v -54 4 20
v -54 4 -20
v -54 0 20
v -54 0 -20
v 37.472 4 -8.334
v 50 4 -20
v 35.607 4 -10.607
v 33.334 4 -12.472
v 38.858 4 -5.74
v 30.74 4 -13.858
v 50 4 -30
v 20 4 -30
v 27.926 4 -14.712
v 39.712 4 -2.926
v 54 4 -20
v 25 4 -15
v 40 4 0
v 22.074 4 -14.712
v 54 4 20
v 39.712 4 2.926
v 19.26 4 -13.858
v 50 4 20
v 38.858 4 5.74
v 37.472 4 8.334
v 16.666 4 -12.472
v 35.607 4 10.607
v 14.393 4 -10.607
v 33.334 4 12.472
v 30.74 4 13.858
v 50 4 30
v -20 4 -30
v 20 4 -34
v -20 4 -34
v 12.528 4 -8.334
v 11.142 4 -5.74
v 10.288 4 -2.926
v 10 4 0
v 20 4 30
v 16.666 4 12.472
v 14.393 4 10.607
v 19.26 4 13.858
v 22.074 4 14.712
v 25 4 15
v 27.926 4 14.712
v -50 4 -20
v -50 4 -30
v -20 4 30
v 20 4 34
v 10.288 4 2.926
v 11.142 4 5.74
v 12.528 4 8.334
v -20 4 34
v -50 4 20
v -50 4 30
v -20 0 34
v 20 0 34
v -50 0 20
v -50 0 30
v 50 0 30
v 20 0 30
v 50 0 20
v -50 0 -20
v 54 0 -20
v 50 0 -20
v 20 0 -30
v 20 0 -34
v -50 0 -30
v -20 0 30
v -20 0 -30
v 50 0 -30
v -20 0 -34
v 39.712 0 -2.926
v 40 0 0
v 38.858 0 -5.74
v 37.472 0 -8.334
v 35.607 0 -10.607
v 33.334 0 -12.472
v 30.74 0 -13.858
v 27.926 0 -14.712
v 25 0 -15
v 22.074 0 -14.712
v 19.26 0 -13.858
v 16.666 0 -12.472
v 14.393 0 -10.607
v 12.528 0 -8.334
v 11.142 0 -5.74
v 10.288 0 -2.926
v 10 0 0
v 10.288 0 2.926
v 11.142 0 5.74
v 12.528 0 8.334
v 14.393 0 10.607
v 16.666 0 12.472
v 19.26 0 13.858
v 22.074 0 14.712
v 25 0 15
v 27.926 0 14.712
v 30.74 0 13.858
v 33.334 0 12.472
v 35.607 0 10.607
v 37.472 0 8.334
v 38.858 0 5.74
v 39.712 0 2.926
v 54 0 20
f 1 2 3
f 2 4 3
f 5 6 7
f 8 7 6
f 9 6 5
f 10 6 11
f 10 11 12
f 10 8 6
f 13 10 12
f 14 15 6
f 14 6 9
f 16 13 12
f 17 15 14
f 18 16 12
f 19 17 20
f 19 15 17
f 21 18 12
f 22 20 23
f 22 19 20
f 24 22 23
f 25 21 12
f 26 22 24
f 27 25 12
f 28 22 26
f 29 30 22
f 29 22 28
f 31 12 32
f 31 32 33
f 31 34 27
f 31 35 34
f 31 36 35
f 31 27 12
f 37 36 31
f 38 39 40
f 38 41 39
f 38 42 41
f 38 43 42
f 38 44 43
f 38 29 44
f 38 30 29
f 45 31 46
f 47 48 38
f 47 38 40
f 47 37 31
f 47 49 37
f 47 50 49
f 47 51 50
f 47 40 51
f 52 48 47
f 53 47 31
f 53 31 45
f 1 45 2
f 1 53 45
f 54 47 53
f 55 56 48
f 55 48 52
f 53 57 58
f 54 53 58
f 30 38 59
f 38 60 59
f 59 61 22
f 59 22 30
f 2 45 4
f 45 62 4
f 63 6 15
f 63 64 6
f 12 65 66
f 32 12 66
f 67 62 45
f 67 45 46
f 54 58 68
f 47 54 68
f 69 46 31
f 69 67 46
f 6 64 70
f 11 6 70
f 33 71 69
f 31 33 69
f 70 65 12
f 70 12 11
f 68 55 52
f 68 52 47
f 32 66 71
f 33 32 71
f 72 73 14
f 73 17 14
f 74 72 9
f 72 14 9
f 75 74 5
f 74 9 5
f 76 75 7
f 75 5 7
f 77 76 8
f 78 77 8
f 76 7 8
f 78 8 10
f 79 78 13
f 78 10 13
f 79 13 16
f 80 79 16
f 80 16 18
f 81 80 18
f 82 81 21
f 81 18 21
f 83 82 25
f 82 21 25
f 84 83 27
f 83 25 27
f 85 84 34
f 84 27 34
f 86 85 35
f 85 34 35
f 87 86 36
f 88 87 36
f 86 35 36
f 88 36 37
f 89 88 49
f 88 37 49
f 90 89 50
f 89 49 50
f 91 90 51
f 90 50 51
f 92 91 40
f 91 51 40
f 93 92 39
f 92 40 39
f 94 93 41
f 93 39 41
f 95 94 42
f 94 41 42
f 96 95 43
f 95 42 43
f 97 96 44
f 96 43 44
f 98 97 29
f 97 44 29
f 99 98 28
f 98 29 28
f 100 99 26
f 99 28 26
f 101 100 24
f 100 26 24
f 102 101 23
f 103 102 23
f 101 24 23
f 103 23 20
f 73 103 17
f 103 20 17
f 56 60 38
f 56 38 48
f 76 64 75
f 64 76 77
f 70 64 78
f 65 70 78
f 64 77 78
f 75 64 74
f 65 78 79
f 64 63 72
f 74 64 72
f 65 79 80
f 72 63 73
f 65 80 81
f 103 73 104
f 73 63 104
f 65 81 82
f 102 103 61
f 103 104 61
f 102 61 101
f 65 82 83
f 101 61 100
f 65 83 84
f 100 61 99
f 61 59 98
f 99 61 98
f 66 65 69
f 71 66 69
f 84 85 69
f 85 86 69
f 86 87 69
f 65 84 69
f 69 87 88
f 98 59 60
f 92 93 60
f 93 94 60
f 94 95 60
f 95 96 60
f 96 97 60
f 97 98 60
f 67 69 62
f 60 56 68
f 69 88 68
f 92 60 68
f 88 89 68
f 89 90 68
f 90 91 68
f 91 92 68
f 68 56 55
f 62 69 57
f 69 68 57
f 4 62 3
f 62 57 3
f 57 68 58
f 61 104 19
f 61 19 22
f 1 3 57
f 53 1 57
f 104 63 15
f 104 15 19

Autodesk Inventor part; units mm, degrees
ref_plane "YZ Plane" through (0, 0, 0) normal (1, 0, 0) x (0, 1, 0)
ref_plane "XZ Plane" through (0, 0, 0) normal (0, 1, 0) x (-1, 0, 0)
ref_plane "XY Plane" through (0, 0, 0) normal (0, 0, 1) x (1, 0, 0)
sketch "Sketch1" plane through (0, 0, 0) normal (0, 1, 0) x (-1, 0, 0)
  line L0 (50, 30) -> (-50, 30) construction
  line L1 (-50, 30) -> (-50, -30) construction
  line L2 (-50, -30) -> (50, -30) construction
  line L3 (50, -30) -> (50, 30) construction
  line L4 (20, 30) -> (-20, 30) construction
  line L5 (-20, 30) -> (-20, 34)
  line L6 (-20, 34) -> (20, 34)
  line L7 (20, 34) -> (20, 30)
  line L8 (20, -30) -> (-20, -30) construction
  line L9 (-20, -30) -> (-20, -34)
  line L10 (-20, -34) -> (20, -34)
  line L11 (20, -34) -> (20, -30)
  line L12 (-50, -20) -> (-54, -20)
  line L13 (-54, -20) -> (-54, 20)
  line L14 (-54, 20) -> (-50, 20)
  line L15 (-50, 20) -> (-50, -20) construction
  line L16 (50, -20) -> (54, -20)
  line L17 (54, -20) -> (54, 20)
  line L18 (54, 20) -> (50, 20)
  line L19 (50, 20) -> (50, -20) construction
  line L20 (50, -20) -> (50, -30)
  line L21 (50, -30) -> (20, -30)
  line L22 (-20, -30) -> (-50, -30)
  line L23 (-50, -20) -> (-50, -30)
  line L24 (-50, 20) -> (-50, 30)
  line L25 (-20, 30) -> (-50, 30)
  line L26 (50, 20) -> (50, 30)
  line L27 (50, 30) -> (20, 30)
  point P0 (0, 0)
  point P1 (52, -20)
  point P2 (-52, 20)
  point P3 (52, 20)
  point P4 (0, -30)
  point P5 (0, 30)
  point P6 (50, 0)
  point P7 (-50, 0)
  point P8 (0, -30)
  point P9 (50, 0)
  dimension "d0" = 40
  dimension "d1" = 4
  dimension "d2" = 100
  dimension "d3" = 60
extrude "Extrusion1" add sketch "Sketch1" along normal blind 4
sketch "Sketch2" plane through (0, 4, 0) normal (0, 1, 0) x (1, 0, 0)
  circle A0 centre (25, 0) radius 15
  line L0 (50, 20) -> (50, 30) projected
  point P0 (0, 0)
  dimension "d6" = 30
  dimension "d7" = 10
extrude "Extrusion2" cut sketch "Sketch2" against normal blind 4
properties part number "SideMale_100wx60h_V1" material "Wood (Oak)"
